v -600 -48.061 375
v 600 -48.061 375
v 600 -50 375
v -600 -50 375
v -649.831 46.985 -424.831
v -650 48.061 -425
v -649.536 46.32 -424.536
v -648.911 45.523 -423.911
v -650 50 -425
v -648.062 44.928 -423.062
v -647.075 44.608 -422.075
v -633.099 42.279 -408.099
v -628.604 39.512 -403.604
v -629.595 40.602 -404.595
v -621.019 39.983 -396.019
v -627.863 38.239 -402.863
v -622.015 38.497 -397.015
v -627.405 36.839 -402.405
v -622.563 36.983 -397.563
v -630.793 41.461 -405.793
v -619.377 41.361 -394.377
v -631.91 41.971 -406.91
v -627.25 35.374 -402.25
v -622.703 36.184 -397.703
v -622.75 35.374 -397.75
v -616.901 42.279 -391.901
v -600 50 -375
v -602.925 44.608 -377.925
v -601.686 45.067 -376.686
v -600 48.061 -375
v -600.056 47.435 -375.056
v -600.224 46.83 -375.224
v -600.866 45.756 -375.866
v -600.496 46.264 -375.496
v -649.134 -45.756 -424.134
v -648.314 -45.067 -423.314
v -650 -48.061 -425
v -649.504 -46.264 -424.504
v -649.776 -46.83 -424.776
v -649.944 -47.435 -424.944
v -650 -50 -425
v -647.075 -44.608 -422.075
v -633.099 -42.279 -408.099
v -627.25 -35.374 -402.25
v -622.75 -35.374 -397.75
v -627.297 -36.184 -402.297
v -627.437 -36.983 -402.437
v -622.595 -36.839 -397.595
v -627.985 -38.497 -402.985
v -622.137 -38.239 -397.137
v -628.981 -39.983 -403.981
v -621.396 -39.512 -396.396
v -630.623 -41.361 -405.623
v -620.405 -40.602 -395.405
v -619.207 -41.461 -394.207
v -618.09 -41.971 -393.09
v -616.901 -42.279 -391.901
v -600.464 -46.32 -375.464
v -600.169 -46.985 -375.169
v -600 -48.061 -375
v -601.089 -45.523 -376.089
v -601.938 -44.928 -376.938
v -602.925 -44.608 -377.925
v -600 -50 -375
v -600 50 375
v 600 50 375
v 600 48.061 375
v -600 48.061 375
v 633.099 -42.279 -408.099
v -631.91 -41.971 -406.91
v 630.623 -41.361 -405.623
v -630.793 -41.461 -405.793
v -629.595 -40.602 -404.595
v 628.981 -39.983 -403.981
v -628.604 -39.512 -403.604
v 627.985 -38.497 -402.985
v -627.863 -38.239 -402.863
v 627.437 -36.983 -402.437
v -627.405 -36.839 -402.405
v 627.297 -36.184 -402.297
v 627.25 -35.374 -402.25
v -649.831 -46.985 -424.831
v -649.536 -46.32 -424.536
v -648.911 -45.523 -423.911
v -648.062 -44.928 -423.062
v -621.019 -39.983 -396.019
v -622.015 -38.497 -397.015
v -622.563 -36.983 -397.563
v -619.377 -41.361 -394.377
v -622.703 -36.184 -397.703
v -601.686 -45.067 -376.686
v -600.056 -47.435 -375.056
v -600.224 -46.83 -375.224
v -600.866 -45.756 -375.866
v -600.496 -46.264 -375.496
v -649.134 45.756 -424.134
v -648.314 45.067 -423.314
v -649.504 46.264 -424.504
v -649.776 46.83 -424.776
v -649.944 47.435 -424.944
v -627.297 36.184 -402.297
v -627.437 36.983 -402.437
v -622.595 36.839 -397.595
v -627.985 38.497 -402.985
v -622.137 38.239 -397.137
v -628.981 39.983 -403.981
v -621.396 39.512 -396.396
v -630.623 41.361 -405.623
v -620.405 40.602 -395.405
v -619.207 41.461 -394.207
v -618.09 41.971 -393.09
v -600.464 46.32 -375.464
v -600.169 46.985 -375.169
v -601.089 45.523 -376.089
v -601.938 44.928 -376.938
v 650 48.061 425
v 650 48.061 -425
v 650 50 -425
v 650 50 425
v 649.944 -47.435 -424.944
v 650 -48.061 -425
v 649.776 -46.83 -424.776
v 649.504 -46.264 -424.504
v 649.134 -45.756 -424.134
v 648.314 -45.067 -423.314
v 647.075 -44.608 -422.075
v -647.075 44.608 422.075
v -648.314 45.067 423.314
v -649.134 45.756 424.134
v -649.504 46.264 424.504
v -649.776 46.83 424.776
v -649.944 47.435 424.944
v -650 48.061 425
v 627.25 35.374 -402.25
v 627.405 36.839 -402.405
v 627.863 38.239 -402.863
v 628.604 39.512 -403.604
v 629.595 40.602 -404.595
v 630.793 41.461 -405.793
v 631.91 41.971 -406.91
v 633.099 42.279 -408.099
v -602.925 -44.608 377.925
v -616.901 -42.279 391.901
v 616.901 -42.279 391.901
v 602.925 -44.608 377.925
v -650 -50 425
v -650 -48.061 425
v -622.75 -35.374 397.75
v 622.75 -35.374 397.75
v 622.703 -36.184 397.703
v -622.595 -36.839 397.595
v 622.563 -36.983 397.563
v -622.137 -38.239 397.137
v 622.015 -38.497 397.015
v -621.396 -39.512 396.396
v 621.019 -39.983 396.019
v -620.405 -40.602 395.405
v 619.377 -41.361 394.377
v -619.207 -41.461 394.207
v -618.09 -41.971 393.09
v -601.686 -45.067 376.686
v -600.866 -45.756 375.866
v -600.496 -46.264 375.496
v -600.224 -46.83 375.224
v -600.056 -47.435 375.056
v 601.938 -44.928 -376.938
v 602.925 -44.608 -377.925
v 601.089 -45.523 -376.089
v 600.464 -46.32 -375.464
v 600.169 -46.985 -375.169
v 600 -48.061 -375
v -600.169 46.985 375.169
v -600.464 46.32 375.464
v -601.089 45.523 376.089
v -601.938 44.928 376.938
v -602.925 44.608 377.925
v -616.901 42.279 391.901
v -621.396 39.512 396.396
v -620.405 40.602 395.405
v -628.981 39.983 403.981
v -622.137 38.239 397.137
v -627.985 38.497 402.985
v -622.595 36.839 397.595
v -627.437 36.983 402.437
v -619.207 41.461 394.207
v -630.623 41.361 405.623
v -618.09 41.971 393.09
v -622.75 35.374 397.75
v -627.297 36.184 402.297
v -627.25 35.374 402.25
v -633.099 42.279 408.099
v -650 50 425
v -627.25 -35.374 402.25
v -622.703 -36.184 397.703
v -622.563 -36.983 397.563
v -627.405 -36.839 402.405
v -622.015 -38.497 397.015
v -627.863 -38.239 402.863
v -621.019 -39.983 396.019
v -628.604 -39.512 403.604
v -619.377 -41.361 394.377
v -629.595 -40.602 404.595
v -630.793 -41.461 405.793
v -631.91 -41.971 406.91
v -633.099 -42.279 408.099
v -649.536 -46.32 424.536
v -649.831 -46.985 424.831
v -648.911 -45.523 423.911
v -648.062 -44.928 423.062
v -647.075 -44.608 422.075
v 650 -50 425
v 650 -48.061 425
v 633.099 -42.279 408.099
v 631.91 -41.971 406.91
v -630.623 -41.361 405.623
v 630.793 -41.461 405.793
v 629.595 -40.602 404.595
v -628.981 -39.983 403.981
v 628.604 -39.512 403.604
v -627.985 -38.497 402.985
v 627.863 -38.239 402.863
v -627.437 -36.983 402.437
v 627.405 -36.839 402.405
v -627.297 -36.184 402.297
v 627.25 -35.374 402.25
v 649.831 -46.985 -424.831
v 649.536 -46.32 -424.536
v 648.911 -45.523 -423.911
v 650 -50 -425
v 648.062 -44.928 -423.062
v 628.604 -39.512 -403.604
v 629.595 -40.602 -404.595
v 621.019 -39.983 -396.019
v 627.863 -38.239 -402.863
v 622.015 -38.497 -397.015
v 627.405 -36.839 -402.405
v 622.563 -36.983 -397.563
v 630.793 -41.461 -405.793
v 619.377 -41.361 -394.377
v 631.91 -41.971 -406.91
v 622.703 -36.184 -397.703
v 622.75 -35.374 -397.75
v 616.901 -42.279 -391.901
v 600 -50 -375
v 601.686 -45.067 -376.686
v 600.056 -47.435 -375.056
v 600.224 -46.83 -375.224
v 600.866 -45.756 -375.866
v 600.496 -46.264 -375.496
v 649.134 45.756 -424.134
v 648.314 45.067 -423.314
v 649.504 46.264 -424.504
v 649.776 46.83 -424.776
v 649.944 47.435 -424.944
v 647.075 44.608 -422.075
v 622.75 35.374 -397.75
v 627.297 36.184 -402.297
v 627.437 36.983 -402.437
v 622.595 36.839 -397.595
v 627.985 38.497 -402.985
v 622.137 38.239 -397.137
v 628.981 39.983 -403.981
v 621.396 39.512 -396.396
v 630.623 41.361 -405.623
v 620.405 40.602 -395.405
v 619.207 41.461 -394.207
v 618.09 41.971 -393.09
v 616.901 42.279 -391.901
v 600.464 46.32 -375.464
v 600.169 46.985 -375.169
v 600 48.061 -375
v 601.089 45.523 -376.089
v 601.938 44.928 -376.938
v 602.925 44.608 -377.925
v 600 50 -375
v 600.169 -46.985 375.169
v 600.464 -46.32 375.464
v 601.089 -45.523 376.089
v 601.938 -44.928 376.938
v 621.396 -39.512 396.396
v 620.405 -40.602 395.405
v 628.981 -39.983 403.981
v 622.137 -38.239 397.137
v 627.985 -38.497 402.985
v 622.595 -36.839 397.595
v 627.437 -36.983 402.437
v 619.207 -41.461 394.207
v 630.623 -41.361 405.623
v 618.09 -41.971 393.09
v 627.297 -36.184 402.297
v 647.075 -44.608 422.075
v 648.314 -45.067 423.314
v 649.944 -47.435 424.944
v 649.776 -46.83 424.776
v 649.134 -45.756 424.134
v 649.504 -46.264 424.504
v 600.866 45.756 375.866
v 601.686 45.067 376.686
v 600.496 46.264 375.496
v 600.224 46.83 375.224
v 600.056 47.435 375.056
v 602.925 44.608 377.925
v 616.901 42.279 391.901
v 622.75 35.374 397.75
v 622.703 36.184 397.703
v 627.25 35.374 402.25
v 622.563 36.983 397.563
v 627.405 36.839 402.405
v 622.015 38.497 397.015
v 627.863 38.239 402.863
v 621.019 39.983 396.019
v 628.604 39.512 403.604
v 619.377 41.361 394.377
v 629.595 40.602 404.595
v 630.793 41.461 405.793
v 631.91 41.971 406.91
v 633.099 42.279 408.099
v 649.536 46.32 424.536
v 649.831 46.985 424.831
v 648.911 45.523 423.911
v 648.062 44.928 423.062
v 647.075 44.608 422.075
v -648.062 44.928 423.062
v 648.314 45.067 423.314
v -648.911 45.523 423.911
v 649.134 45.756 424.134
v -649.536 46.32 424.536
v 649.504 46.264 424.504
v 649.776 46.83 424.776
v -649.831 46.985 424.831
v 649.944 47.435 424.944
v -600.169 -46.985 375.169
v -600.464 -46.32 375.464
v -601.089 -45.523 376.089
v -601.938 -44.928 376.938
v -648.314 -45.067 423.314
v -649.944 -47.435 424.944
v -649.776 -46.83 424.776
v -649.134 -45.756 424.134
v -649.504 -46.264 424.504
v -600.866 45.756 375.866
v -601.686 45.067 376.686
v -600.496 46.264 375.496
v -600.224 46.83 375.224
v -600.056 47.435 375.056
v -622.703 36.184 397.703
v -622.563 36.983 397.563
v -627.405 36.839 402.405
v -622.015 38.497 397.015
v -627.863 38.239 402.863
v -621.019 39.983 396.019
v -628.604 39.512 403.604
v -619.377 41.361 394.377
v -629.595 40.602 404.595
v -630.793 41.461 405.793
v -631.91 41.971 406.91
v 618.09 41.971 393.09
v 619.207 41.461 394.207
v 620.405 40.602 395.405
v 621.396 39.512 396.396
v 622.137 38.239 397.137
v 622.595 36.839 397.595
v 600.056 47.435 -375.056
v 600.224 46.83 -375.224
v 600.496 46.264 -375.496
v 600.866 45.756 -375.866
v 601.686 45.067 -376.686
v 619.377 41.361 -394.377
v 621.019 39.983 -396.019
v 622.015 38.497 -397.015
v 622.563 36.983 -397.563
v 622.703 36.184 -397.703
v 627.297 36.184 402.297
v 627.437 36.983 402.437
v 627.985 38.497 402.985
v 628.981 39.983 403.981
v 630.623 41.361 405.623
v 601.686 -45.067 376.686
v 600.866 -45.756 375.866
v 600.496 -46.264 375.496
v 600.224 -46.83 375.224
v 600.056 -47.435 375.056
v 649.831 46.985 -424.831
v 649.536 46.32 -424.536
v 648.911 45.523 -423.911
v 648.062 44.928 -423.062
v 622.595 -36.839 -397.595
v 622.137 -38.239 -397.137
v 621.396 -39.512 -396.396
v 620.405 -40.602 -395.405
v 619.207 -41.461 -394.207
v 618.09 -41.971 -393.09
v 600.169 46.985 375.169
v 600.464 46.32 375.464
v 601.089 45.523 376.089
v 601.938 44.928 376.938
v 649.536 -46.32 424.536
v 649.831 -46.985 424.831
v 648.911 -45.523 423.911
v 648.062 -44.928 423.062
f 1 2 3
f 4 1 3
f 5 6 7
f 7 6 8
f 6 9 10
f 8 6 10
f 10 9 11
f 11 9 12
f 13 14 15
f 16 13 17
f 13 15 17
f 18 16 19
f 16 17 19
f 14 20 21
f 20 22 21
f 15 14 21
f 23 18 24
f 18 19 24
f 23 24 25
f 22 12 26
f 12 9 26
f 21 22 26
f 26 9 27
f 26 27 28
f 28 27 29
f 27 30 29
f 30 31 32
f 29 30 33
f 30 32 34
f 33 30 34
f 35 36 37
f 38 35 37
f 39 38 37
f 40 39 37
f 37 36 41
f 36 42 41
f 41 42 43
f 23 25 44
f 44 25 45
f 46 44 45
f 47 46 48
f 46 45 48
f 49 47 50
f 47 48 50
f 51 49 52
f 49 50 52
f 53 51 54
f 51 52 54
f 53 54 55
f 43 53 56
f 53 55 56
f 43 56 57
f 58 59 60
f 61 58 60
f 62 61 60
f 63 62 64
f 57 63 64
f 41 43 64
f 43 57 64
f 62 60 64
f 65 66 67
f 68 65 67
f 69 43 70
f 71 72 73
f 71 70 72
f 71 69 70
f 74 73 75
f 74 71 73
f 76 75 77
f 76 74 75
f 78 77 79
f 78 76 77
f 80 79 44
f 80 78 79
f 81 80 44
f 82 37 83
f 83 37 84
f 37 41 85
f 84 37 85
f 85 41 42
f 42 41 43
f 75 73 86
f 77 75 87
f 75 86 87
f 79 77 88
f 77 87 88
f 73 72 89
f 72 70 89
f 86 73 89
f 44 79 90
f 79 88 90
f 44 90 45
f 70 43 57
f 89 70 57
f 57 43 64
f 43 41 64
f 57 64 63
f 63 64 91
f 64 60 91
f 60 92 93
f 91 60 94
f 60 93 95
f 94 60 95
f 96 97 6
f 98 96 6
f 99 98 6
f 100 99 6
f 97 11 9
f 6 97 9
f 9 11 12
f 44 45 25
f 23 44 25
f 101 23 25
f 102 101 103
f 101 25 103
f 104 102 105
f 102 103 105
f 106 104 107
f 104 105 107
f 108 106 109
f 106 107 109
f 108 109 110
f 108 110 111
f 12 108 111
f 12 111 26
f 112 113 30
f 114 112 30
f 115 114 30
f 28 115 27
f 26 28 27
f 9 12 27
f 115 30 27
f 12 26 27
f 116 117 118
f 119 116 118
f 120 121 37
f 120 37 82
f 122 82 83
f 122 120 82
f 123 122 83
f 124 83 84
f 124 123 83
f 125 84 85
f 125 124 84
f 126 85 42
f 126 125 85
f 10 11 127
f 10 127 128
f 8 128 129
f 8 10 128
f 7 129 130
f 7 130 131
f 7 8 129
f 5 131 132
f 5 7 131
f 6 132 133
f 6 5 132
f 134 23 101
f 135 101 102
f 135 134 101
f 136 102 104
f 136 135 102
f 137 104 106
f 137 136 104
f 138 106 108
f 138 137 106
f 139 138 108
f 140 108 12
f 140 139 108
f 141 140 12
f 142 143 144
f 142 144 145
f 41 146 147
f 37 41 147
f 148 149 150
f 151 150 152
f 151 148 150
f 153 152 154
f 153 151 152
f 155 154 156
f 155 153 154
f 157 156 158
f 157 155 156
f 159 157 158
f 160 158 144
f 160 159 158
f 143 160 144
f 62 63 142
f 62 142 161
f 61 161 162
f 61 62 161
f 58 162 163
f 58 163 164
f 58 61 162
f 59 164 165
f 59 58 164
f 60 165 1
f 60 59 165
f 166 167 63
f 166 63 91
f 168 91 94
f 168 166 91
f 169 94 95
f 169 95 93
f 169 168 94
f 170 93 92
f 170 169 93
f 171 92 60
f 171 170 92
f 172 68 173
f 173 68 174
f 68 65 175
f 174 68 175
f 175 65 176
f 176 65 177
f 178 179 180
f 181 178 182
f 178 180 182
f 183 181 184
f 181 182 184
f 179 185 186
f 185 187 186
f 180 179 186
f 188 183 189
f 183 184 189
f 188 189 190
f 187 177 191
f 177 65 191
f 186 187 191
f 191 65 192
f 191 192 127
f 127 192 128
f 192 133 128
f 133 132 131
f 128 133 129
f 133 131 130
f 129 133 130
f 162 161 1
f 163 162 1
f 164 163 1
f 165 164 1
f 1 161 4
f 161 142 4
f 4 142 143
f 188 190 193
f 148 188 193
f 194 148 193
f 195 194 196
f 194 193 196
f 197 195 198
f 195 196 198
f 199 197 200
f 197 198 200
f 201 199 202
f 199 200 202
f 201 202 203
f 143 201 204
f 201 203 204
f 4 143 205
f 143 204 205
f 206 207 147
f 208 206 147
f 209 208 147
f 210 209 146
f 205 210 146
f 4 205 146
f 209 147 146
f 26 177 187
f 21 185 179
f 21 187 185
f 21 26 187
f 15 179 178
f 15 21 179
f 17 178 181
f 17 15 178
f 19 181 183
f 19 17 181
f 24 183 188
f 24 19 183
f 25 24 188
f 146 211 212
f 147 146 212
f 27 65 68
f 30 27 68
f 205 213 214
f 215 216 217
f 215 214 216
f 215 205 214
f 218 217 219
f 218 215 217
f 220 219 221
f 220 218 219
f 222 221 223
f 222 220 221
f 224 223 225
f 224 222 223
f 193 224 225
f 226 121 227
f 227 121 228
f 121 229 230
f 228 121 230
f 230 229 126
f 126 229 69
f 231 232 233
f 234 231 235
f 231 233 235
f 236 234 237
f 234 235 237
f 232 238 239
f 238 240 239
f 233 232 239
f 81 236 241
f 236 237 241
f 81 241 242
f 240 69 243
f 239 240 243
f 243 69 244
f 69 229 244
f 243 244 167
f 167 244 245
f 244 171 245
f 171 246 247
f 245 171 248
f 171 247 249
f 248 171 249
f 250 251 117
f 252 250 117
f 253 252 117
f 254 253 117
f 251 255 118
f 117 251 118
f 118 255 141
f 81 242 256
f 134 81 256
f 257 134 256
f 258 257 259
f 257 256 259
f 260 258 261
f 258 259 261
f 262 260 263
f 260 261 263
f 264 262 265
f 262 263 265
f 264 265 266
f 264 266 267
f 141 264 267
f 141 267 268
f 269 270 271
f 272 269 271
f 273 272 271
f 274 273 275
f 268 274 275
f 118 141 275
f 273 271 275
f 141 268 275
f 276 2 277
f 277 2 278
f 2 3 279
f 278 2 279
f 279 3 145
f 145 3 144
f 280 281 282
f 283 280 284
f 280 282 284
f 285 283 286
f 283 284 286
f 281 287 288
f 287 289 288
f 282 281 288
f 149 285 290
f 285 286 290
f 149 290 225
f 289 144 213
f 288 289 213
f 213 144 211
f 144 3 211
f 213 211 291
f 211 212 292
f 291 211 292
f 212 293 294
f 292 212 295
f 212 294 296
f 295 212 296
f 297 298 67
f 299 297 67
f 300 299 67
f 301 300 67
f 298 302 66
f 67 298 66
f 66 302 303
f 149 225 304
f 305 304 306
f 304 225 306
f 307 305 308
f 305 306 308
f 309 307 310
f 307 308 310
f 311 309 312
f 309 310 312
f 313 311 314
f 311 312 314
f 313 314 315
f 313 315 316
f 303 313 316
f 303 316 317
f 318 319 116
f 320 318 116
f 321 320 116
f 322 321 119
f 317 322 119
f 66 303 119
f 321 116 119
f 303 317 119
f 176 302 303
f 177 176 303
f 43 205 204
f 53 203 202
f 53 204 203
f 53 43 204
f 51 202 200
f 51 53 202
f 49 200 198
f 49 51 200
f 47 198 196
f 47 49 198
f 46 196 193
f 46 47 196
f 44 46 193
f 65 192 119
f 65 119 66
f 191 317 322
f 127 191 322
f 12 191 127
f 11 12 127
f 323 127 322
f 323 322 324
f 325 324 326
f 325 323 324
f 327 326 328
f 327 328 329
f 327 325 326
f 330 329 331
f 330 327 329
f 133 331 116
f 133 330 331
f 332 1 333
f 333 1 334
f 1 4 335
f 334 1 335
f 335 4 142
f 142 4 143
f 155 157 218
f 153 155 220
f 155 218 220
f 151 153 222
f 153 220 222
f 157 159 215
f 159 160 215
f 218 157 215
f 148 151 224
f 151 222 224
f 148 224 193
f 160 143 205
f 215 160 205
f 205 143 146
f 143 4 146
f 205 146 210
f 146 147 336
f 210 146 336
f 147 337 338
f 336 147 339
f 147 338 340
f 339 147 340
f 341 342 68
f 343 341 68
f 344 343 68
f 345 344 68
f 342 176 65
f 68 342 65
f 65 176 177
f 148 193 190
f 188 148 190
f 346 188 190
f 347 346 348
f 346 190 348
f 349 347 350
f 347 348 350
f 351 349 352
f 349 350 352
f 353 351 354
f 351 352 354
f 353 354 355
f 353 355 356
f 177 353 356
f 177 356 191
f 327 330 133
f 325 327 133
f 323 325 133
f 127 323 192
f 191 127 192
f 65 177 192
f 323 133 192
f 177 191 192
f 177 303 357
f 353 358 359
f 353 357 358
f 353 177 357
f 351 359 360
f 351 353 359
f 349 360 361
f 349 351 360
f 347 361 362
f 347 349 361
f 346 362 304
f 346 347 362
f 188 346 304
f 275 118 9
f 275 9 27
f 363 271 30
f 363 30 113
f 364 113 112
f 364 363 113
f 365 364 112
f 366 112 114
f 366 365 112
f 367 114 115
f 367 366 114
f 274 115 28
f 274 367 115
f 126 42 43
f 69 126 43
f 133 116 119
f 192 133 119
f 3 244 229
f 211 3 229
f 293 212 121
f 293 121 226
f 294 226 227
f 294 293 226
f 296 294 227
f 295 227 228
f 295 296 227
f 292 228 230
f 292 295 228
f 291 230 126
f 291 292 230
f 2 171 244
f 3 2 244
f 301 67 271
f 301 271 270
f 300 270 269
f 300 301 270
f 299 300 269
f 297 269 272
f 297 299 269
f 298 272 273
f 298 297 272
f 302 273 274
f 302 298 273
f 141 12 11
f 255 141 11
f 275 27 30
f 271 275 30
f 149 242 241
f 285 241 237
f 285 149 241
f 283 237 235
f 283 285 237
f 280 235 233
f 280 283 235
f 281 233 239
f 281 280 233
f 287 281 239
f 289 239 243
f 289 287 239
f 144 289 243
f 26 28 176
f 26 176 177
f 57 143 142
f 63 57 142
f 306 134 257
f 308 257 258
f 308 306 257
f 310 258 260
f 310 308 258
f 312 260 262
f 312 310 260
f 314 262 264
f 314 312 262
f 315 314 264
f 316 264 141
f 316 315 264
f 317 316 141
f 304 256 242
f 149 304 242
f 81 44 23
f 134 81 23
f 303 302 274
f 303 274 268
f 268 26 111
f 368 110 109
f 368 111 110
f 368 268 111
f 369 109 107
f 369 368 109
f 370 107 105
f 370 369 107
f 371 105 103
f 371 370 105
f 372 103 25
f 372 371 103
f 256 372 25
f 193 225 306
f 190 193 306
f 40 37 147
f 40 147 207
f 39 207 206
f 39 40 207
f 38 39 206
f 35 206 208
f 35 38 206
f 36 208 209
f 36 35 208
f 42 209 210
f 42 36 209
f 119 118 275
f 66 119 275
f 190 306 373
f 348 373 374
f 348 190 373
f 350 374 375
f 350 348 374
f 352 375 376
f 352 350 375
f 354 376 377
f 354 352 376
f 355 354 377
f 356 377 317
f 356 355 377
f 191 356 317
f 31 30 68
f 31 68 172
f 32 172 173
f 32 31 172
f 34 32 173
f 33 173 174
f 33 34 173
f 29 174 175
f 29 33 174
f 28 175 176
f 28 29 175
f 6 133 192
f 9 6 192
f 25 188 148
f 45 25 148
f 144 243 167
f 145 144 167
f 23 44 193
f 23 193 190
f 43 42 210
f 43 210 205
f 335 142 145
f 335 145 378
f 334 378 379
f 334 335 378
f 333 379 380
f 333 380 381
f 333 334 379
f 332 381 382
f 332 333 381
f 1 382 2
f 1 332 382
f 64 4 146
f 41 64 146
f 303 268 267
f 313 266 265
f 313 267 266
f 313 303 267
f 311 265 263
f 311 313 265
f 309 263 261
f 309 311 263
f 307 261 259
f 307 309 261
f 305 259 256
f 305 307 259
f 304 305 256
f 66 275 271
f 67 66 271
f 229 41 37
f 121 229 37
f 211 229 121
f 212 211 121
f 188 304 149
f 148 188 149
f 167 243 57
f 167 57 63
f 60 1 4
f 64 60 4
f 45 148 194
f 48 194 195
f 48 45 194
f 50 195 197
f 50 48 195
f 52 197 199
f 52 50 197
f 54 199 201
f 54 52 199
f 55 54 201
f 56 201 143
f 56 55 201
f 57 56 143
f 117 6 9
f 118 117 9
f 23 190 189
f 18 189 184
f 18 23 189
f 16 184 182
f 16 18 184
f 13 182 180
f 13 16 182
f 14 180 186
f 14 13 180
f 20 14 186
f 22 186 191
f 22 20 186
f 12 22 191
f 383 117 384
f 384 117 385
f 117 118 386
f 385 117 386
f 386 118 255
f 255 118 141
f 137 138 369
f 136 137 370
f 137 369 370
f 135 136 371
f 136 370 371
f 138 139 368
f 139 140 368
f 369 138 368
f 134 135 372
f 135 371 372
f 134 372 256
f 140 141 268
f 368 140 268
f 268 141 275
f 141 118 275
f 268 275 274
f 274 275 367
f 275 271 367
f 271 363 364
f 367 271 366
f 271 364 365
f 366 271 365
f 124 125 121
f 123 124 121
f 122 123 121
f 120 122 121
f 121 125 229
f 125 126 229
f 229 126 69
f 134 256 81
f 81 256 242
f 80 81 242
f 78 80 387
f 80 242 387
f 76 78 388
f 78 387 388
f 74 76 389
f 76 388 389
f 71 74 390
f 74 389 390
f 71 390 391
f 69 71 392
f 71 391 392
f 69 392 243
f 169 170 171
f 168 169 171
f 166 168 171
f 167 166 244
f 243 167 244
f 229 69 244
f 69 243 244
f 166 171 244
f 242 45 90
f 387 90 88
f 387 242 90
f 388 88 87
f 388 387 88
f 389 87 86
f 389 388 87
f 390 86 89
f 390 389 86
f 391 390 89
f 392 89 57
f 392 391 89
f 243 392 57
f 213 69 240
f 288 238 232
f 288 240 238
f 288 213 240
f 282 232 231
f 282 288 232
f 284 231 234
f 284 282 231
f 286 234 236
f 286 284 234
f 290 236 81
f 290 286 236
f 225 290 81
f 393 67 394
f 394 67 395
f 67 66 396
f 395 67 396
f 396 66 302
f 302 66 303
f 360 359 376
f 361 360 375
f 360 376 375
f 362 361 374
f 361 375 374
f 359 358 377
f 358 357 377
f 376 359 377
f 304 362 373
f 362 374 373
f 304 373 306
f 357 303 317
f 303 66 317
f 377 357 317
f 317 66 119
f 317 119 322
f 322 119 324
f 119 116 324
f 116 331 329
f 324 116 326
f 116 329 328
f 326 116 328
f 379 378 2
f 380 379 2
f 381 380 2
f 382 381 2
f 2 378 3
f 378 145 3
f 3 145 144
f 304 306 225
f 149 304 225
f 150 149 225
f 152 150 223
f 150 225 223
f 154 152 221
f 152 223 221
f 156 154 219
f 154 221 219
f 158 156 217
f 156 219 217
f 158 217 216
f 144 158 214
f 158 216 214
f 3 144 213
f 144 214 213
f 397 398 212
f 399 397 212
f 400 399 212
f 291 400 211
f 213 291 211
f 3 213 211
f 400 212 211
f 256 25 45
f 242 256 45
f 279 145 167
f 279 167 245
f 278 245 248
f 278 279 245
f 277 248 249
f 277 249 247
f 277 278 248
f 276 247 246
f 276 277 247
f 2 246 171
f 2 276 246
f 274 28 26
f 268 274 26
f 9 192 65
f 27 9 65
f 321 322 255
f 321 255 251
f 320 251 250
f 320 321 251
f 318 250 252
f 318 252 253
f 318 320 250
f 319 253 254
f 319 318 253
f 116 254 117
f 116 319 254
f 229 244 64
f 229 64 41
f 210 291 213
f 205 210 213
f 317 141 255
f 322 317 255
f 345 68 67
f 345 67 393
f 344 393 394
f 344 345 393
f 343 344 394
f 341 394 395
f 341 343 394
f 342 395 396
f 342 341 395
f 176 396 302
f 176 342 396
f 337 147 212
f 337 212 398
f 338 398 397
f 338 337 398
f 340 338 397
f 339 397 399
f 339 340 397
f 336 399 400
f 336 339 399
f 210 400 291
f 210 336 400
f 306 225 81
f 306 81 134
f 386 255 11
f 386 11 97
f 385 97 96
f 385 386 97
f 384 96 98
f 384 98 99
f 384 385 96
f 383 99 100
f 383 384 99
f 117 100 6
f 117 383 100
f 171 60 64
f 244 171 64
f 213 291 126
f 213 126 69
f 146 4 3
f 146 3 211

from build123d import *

# Parameters (mm, degrees)
SB_BEAM_100_X_8_1_DEPTH      = 856.901699437
SB_BEAM_100_X_8_1_DEPTH_BACK = 56.901699437
SB_BEAM_100_X_8_1_2_DEPTH    = 1363.803398875
SB_BEAM_100_X_8_1_3_DEPTH    = 913.803398875
SB_BEAM_100_X_8_1_4_DEPTH    = 1363.803398875


with BuildPart() as part:
    # Sketch11 → Sb beam 100 X 8(1) (new, two sides: drawn at the far end of the back side and taken through both)
    with BuildSketch(Plane(origin=(-625, 0, -400), x_dir=(1, 0, 0), z_dir=(0, 0, 1)).offset(-SB_BEAM_100_X_8_1_DEPTH_BACK)):
        with BuildLine():
            Line((-25, -50), (-25, -48.060671023))
            ThreePointArc((-25, -48.060671023), (-24.17058332, -45.798374682), (-22.075437296, -44.608299096))
            Line((-22.075437296, -44.608299096), (-8.099125408, -42.278743853))
            ThreePointArc((-8.099125408, -42.278743853), (-3.90883336, -39.898592681), (-2.25, -35.374))
            Line((-2.25, -35.374), (-2.25, 35.374))
            ThreePointArc((-2.25, 35.374), (-3.90883336, 39.898592681), (-8.099125408, 42.278743853))
            Line((-8.099125408, 42.278743853), (-22.075437296, 44.608299096))
            ThreePointArc((-22.075437296, 44.608299096), (-24.17058332, 45.798374682), (-25, 48.060671023))
            Line((-25, 48.060671023), (-25, 50))
            Line((-25, 50), (25, 50))
            Line((25, 50), (25, 48.060671023))
            ThreePointArc((25, 48.060671023), (24.17058332, 45.798374682), (22.075437296, 44.608299096))
            Line((22.075437296, 44.608299096), (8.099125408, 42.278743853))
            ThreePointArc((8.099125408, 42.278743853), (3.90883336, 39.898592681), (2.25, 35.374))
            Line((2.25, 35.374), (2.25, -35.374))
            ThreePointArc((2.25, -35.374), (3.90883336, -39.898592681), (8.099125408, -42.278743853))
            Line((8.099125408, -42.278743853), (22.075437296, -44.608299096))
            ThreePointArc((22.075437296, -44.608299096), (24.17058332, -45.798374682), (25, -48.060671023))
            Line((25, -48.060671023), (25, -50))
            Line((25, -50), (-25, -50))
        make_face()
    extrude(amount=SB_BEAM_100_X_8_1_DEPTH + SB_BEAM_100_X_8_1_DEPTH_BACK)

    # Sb beam 100 X 8(1) mitre 1
    split(bisect_by=Plane(origin=(-625, 0, -400), x_dir=(0, -1, 0), z_dir=(-0.707106781, 0, 0.707106781)), keep=Keep.TOP)

    # Sb beam 100 X 8(1) mitre 2
    split(bisect_by=Plane(origin=(-625, 0, 400), x_dir=(0, -1, 0), z_dir=(-0.707106781, 0, -0.707106781)), keep=Keep.TOP)


with BuildPart() as body_2:
    # Sketch11 on segment 2 (carried to segment 2) → Sb beam 100 X 8_1 2 (new body)
    with BuildSketch(Plane(origin=(-681.901699437, 0, 400), x_dir=(0, 0, -1), z_dir=(1, 0, 0))):
        with BuildLine():
            Line((-25, -50), (-25, -48.060671023))
            ThreePointArc((-25, -48.060671023), (-24.17058332, -45.798374682), (-22.075437296, -44.608299096))
            Line((-22.075437296, -44.608299096), (-8.099125408, -42.278743853))
            ThreePointArc((-8.099125408, -42.278743853), (-3.90883336, -39.898592681), (-2.25, -35.374))
            Line((-2.25, -35.374), (-2.25, 35.374))
            ThreePointArc((-2.25, 35.374), (-3.90883336, 39.898592681), (-8.099125408, 42.278743853))
            Line((-8.099125408, 42.278743853), (-22.075437296, 44.608299096))
            ThreePointArc((-22.075437296, 44.608299096), (-24.17058332, 45.798374682), (-25, 48.060671023))
            Line((-25, 48.060671023), (-25, 50))
            Line((-25, 50), (25, 50))
            Line((25, 50), (25, 48.060671023))
            ThreePointArc((25, 48.060671023), (24.17058332, 45.798374682), (22.075437296, 44.608299096))
            Line((22.075437296, 44.608299096), (8.099125408, 42.278743853))
            ThreePointArc((8.099125408, 42.278743853), (3.90883336, 39.898592681), (2.25, 35.374))
            Line((2.25, 35.374), (2.25, -35.374))
            ThreePointArc((2.25, -35.374), (3.90883336, -39.898592681), (8.099125408, -42.278743853))
            Line((8.099125408, -42.278743853), (22.075437296, -44.608299096))
            ThreePointArc((22.075437296, -44.608299096), (24.17058332, -45.798374682), (25, -48.060671023))
            Line((25, -48.060671023), (25, -50))
            Line((25, -50), (-25, -50))
        make_face()
    extrude(amount=SB_BEAM_100_X_8_1_2_DEPTH)

    # Sb beam 100 X 8_1 2 mitre 1
    split(bisect_by=Plane(origin=(-625, 0, 400), x_dir=(0, 1, 0), z_dir=(0.707106781, 0, 0.707106781)), keep=Keep.TOP)

    # Sb beam 100 X 8_1 2 mitre 2
    split(bisect_by=Plane(origin=(625, 0, 400), x_dir=(0, -1, 0), z_dir=(-0.707106781, 0, 0.707106781)), keep=Keep.TOP)


with BuildPart() as body_3:
    # Sketch11 on segment 3 (carried to segment 3) → Sb beam 100 X 8_1 3 (new body)
    with BuildSketch(Plane(origin=(625, 0, 456.901699437), x_dir=(-1, 0, 0), z_dir=(0, 0, -1))):
        with BuildLine():
            Line((-25, -50), (-25, -48.060671023))
            ThreePointArc((-25, -48.060671023), (-24.17058332, -45.798374682), (-22.075437296, -44.608299096))
            Line((-22.075437296, -44.608299096), (-8.099125408, -42.278743853))
            ThreePointArc((-8.099125408, -42.278743853), (-3.90883336, -39.898592681), (-2.25, -35.374))
            Line((-2.25, -35.374), (-2.25, 35.374))
            ThreePointArc((-2.25, 35.374), (-3.90883336, 39.898592681), (-8.099125408, 42.278743853))
            Line((-8.099125408, 42.278743853), (-22.075437296, 44.608299096))
            ThreePointArc((-22.075437296, 44.608299096), (-24.17058332, 45.798374682), (-25, 48.060671023))
            Line((-25, 48.060671023), (-25, 50))
            Line((-25, 50), (25, 50))
            Line((25, 50), (25, 48.060671023))
            ThreePointArc((25, 48.060671023), (24.17058332, 45.798374682), (22.075437296, 44.608299096))
            Line((22.075437296, 44.608299096), (8.099125408, 42.278743853))
            ThreePointArc((8.099125408, 42.278743853), (3.90883336, 39.898592681), (2.25, 35.374))
            Line((2.25, 35.374), (2.25, -35.374))
            ThreePointArc((2.25, -35.374), (3.90883336, -39.898592681), (8.099125408, -42.278743853))
            Line((8.099125408, -42.278743853), (22.075437296, -44.608299096))
            ThreePointArc((22.075437296, -44.608299096), (24.17058332, -45.798374682), (25, -48.060671023))
            Line((25, -48.060671023), (25, -50))
            Line((25, -50), (-25, -50))
        make_face()
    extrude(amount=SB_BEAM_100_X_8_1_3_DEPTH)

    # Sb beam 100 X 8_1 3 mitre 1
    split(bisect_by=Plane(origin=(625, 0, -400), x_dir=(0, 1, 0), z_dir=(0.707106781, 0, 0.707106781)), keep=Keep.TOP)

    # Sb beam 100 X 8_1 3 mitre 2
    split(bisect_by=Plane(origin=(625, 0, 400), x_dir=(0, 1, 0), z_dir=(0.707106781, 0, -0.707106781)), keep=Keep.TOP)


with BuildPart() as body_4:
    # Sketch11 on segment 4 (carried to segment 4) → Sb beam 100 X 8_1 4 (new body)
    with BuildSketch(Plane(origin=(681.901699437, 0, -400), x_dir=(0, 0, 1), z_dir=(-1, 0, 0))):
        with BuildLine():
            Line((-25, -50), (-25, -48.060671023))
            ThreePointArc((-25, -48.060671023), (-24.17058332, -45.798374682), (-22.075437296, -44.608299096))
            Line((-22.075437296, -44.608299096), (-8.099125408, -42.278743853))
            ThreePointArc((-8.099125408, -42.278743853), (-3.90883336, -39.898592681), (-2.25, -35.374))
            Line((-2.25, -35.374), (-2.25, 35.374))
            ThreePointArc((-2.25, 35.374), (-3.90883336, 39.898592681), (-8.099125408, 42.278743853))
            Line((-8.099125408, 42.278743853), (-22.075437296, 44.608299096))
            ThreePointArc((-22.075437296, 44.608299096), (-24.17058332, 45.798374682), (-25, 48.060671023))
            Line((-25, 48.060671023), (-25, 50))
            Line((-25, 50), (25, 50))
            Line((25, 50), (25, 48.060671023))
            ThreePointArc((25, 48.060671023), (24.17058332, 45.798374682), (22.075437296, 44.608299096))
            Line((22.075437296, 44.608299096), (8.099125408, 42.278743853))
            ThreePointArc((8.099125408, 42.278743853), (3.90883336, 39.898592681), (2.25, 35.374))
            Line((2.25, 35.374), (2.25, -35.374))
            ThreePointArc((2.25, -35.374), (3.90883336, -39.898592681), (8.099125408, -42.278743853))
            Line((8.099125408, -42.278743853), (22.075437296, -44.608299096))
            ThreePointArc((22.075437296, -44.608299096), (24.17058332, -45.798374682), (25, -48.060671023))
            Line((25, -48.060671023), (25, -50))
            Line((25, -50), (-25, -50))
        make_face()
    extrude(amount=SB_BEAM_100_X_8_1_4_DEPTH)

    # Sb beam 100 X 8_1 4 mitre 1
    split(bisect_by=Plane(origin=(-625, 0, -400), x_dir=(0, 1, 0), z_dir=(0.707106781, 0, -0.707106781)), keep=Keep.TOP)

    # Sb beam 100 X 8_1 4 mitre 2
    split(bisect_by=Plane(origin=(625, 0, -400), x_dir=(0, -1, 0), z_dir=(-0.707106781, 0, -0.707106781)), keep=Keep.TOP)


solid = Compound([part.part, body_2.part, body_3.part, body_4.part])
